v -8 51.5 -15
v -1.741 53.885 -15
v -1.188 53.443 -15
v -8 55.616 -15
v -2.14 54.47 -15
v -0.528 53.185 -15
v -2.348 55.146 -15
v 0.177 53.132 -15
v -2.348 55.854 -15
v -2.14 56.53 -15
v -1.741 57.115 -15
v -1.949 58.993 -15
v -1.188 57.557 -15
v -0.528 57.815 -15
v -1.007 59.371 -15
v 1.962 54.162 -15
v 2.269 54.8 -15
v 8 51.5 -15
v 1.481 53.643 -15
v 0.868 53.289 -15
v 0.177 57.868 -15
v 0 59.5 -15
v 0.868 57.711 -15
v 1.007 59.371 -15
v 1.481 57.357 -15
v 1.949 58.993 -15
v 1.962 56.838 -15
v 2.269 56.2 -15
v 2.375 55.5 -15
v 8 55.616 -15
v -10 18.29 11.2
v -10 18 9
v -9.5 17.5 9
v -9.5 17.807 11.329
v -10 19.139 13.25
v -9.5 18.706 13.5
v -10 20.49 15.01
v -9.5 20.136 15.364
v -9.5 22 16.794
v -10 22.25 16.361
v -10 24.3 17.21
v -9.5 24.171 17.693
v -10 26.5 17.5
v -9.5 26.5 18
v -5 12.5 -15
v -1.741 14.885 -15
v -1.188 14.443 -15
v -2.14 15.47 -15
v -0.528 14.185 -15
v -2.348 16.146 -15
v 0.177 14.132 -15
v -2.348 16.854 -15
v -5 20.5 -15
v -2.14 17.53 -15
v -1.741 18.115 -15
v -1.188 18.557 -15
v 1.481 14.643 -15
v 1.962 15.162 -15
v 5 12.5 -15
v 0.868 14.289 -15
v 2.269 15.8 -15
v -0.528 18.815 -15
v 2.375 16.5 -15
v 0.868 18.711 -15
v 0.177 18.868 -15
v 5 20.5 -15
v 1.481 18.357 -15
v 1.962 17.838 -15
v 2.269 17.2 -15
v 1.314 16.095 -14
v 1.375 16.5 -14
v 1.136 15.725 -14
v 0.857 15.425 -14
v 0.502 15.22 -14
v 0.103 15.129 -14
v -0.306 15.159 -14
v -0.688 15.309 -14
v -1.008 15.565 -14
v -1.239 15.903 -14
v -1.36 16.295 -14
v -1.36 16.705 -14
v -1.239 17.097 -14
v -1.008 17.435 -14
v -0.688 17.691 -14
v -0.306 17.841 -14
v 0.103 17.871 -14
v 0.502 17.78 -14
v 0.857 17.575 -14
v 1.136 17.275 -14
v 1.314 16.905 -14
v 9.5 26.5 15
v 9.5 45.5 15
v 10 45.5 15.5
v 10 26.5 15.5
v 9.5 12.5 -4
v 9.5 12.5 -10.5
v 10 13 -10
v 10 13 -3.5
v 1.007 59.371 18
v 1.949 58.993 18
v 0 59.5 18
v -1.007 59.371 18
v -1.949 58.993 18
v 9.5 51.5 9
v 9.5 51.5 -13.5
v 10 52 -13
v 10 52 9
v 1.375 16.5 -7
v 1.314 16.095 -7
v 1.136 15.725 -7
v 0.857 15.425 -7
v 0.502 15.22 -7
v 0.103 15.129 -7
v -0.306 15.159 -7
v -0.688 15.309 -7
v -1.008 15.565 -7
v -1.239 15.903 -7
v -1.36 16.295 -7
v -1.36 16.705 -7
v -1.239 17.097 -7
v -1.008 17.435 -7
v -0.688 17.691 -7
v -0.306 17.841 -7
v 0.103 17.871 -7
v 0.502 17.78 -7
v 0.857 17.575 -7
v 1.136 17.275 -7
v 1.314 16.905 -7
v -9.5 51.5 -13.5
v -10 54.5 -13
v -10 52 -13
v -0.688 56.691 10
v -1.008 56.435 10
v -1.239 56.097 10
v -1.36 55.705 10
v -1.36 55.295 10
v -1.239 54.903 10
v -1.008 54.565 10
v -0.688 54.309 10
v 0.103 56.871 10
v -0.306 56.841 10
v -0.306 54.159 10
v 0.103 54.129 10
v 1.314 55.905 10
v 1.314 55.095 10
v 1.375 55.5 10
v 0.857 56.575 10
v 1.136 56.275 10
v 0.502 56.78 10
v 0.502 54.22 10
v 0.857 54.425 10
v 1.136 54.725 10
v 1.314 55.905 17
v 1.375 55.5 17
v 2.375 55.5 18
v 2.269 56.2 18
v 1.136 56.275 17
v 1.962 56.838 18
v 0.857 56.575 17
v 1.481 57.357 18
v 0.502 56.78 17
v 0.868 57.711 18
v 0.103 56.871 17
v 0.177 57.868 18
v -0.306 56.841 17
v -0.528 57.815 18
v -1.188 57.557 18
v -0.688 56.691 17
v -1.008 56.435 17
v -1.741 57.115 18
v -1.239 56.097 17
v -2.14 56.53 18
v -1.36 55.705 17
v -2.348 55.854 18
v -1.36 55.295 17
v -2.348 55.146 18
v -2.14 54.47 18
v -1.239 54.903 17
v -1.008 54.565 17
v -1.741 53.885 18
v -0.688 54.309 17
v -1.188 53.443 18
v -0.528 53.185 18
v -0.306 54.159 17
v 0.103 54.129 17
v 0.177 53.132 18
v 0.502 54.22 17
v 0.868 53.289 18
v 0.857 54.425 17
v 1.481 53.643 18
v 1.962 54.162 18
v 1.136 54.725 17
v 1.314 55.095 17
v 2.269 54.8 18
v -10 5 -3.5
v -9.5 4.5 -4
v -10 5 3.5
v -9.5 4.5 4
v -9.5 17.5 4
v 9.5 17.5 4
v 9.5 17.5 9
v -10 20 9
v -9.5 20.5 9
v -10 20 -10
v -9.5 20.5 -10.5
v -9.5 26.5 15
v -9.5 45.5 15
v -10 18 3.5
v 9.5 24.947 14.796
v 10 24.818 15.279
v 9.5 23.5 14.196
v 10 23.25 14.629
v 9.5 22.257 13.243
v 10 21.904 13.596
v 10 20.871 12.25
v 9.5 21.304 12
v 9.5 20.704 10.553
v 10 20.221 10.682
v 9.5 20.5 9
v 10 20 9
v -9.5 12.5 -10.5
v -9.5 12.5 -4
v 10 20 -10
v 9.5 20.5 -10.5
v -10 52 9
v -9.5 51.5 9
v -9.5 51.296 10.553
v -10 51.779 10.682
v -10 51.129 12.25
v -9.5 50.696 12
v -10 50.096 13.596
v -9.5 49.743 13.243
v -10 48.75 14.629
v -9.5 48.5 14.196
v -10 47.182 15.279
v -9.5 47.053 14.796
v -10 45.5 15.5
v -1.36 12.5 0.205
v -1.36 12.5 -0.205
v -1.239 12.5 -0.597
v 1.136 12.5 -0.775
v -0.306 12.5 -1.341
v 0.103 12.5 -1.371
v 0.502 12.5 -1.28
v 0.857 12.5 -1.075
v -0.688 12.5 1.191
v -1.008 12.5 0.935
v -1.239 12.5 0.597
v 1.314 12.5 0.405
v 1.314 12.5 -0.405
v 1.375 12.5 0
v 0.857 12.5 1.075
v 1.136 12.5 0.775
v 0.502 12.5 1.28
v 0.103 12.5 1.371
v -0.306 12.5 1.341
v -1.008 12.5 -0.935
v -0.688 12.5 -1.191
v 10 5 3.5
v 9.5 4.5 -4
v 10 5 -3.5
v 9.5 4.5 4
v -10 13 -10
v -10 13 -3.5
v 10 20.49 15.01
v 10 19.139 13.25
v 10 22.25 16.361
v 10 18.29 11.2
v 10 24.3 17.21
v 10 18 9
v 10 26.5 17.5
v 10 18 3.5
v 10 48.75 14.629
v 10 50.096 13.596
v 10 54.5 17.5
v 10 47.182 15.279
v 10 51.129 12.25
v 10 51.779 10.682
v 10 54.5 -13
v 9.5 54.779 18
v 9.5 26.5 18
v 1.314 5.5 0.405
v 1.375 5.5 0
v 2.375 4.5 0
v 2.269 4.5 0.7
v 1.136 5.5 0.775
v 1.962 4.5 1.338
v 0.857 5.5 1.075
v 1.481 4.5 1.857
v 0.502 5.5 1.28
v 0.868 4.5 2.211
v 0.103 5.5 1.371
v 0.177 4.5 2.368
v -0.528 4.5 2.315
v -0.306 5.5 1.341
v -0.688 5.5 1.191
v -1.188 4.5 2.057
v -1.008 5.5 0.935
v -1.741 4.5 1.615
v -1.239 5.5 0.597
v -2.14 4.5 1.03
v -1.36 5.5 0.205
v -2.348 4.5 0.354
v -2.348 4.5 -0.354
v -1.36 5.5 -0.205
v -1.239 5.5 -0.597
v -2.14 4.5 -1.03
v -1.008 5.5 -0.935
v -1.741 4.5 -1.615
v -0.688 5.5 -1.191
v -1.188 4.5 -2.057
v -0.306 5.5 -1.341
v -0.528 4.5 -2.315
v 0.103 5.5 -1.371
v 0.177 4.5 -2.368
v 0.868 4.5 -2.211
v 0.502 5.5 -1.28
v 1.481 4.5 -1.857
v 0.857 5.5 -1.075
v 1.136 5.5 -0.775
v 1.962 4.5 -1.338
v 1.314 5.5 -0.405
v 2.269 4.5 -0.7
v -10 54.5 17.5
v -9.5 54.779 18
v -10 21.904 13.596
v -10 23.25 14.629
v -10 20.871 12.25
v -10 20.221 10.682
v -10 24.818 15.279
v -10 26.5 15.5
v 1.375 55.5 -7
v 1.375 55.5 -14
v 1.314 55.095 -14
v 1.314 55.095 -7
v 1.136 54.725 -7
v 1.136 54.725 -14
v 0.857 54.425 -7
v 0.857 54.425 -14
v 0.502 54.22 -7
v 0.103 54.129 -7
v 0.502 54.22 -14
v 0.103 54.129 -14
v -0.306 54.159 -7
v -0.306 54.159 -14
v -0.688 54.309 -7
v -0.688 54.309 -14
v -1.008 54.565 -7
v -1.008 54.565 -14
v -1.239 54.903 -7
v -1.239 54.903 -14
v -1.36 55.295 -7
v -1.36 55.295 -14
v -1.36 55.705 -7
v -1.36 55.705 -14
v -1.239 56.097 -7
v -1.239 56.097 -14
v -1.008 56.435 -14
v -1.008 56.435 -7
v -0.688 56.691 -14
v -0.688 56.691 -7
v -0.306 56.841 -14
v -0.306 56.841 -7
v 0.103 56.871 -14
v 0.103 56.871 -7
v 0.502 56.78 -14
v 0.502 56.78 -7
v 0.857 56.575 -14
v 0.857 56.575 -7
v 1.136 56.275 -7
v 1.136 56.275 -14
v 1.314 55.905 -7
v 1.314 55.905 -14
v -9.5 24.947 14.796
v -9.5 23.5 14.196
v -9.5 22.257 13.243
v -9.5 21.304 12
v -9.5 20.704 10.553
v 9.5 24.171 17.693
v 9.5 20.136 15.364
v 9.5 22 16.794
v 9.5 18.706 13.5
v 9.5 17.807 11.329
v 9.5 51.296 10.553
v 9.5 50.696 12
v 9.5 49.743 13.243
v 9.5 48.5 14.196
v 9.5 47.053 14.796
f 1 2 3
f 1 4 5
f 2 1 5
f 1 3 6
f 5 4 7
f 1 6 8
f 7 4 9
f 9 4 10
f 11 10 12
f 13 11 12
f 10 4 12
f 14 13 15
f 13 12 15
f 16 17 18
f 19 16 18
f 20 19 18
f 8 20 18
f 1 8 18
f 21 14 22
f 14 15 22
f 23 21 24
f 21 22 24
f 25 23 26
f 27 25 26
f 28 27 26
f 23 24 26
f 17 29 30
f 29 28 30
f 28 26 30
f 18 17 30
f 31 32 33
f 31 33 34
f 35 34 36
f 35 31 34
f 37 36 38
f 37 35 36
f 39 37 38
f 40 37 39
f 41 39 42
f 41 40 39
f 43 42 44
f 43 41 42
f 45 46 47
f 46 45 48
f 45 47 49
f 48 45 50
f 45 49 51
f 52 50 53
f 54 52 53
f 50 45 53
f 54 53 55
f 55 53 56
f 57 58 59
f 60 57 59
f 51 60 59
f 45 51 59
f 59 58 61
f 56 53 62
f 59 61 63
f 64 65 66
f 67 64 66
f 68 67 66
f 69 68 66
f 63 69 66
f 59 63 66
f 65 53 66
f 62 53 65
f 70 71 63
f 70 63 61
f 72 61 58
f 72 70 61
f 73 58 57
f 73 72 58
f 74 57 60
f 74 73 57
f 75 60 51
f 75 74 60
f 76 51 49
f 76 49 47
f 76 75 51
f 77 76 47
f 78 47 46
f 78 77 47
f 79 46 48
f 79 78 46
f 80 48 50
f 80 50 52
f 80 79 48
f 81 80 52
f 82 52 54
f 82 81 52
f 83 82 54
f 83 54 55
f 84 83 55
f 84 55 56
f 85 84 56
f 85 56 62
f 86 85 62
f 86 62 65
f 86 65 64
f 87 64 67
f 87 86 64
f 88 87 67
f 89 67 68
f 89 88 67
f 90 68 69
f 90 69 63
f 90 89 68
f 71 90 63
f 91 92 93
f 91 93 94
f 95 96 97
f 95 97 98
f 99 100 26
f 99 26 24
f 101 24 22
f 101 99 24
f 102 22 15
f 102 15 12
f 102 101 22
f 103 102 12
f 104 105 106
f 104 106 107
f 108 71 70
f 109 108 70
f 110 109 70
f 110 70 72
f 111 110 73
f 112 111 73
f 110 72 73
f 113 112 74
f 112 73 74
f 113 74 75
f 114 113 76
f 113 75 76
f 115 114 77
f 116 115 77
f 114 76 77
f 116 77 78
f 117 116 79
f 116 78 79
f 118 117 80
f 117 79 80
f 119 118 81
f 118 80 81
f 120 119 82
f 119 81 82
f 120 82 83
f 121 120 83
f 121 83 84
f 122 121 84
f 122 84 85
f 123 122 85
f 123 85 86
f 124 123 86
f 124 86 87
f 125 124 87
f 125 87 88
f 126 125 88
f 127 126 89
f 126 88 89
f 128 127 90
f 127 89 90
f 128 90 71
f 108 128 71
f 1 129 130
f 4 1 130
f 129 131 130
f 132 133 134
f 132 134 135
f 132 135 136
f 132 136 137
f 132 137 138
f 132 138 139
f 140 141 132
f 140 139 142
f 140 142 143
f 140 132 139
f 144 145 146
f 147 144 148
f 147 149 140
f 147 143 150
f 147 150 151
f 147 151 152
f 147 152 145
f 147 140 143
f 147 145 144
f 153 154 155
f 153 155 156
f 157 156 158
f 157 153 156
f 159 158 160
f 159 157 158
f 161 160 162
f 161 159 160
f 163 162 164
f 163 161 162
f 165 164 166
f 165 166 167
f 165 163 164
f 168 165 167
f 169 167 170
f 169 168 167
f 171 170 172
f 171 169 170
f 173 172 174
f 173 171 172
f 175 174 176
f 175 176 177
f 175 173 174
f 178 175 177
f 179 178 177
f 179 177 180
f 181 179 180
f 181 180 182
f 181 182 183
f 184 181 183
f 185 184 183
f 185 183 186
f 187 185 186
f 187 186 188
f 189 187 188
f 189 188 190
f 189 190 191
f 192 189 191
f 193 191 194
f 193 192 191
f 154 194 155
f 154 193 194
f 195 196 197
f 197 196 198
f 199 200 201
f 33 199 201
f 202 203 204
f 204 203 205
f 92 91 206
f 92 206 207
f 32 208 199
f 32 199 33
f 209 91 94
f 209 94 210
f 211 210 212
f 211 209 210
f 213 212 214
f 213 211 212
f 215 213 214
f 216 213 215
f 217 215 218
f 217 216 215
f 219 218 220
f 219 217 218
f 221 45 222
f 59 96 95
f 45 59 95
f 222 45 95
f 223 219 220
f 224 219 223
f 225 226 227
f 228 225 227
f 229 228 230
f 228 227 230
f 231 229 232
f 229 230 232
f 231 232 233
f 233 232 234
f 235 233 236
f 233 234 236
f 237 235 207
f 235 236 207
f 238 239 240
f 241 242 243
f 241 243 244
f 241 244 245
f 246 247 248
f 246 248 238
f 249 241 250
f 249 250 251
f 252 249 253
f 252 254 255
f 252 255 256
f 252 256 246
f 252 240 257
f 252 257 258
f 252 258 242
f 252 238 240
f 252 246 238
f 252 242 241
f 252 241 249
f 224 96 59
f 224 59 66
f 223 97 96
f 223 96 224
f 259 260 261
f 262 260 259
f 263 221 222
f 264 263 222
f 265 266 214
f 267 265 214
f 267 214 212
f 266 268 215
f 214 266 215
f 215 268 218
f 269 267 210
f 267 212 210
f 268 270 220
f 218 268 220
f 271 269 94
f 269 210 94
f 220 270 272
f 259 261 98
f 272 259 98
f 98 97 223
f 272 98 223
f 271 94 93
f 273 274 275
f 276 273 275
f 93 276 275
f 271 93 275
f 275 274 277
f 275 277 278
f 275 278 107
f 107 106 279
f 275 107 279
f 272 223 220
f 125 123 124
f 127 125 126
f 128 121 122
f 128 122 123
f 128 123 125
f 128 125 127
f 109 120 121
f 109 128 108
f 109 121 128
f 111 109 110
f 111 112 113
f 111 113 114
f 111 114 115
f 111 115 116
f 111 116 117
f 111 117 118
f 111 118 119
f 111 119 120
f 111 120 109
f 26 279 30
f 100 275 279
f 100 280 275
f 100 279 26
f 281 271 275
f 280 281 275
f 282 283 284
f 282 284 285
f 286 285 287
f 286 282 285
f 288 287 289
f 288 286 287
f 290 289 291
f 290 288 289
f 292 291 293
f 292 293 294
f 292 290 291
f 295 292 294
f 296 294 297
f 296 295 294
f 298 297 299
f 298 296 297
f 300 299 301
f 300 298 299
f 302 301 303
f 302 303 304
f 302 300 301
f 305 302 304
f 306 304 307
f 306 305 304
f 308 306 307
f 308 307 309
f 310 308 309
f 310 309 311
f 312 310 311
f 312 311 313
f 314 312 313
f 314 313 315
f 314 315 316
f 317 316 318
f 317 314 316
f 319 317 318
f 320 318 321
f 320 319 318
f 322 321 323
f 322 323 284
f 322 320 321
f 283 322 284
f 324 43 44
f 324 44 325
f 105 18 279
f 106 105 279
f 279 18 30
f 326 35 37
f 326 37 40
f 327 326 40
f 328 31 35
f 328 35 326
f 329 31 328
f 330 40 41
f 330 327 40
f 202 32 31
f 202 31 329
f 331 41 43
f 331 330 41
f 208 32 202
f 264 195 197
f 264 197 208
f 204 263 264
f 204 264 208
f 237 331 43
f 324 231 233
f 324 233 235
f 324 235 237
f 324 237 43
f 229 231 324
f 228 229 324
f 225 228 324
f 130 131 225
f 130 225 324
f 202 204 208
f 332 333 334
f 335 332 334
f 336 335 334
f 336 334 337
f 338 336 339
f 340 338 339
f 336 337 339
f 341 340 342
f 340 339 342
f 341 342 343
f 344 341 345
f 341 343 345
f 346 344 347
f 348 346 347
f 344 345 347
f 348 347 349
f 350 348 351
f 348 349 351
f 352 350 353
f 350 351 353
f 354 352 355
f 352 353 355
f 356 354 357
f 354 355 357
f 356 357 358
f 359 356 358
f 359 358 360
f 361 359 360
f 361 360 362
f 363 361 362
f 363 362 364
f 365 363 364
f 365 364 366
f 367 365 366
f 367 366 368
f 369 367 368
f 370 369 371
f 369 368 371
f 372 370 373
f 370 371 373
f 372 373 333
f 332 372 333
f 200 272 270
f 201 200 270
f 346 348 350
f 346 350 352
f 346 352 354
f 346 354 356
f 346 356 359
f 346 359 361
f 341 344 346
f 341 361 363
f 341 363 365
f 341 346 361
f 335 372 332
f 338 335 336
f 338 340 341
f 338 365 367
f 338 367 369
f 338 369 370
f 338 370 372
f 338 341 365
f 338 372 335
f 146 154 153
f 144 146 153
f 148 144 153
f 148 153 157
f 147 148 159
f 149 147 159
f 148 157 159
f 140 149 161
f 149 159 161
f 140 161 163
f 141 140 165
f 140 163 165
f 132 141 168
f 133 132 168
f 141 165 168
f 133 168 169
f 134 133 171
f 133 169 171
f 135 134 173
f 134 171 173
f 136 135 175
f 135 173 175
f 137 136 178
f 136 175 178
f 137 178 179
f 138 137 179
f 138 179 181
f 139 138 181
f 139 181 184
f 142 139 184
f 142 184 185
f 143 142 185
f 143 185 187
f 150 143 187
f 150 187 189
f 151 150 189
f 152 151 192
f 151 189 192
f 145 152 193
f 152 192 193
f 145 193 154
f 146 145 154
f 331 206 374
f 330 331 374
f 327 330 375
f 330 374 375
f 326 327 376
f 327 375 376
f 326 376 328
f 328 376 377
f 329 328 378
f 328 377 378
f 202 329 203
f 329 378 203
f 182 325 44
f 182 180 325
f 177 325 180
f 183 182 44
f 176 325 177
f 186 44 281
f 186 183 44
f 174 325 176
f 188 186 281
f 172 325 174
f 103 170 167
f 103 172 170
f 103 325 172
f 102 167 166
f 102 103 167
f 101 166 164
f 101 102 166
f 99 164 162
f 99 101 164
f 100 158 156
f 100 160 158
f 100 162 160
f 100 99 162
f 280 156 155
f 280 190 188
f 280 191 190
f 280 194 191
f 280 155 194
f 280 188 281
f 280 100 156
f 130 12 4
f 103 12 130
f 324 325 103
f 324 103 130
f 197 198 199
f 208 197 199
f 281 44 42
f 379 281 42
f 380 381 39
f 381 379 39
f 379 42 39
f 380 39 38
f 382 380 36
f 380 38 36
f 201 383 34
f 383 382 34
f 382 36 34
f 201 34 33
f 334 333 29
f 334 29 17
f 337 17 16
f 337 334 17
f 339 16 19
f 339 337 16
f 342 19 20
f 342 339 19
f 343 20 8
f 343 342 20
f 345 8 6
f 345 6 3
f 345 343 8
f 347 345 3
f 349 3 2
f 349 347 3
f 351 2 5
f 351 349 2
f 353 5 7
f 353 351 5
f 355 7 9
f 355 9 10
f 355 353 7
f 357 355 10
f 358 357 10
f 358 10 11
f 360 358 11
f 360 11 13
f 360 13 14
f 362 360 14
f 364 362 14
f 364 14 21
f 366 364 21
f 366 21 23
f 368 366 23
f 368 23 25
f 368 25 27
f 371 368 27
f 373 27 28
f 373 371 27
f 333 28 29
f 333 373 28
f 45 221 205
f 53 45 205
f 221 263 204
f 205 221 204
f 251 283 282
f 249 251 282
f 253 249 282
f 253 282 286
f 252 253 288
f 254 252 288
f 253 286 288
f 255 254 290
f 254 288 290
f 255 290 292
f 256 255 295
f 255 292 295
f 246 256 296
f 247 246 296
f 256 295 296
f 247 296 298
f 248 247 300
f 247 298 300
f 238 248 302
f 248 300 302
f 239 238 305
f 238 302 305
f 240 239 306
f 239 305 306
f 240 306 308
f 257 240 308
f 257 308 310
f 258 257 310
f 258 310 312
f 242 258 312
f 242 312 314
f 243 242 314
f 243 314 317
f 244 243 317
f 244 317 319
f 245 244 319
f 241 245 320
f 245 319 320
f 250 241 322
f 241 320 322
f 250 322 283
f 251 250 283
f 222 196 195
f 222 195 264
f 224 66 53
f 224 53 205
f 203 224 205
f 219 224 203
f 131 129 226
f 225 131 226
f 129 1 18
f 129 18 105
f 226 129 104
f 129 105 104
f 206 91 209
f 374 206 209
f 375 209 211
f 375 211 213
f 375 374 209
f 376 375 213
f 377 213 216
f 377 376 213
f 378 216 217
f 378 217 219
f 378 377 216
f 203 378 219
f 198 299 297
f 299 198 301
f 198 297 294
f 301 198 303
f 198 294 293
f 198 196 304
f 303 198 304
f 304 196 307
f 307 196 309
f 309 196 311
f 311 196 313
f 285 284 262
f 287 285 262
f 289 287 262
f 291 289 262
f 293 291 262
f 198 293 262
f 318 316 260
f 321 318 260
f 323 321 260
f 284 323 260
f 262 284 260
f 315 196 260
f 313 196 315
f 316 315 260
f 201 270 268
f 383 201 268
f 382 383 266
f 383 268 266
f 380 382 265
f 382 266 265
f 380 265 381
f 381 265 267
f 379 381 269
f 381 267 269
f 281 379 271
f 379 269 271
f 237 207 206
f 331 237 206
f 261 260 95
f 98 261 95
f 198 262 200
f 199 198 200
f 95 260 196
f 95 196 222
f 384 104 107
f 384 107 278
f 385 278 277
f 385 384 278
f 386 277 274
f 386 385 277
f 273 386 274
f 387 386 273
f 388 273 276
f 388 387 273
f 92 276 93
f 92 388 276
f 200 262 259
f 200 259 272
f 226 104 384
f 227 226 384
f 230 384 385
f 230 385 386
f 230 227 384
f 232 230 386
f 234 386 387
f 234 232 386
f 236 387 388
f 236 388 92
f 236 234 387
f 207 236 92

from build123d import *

# Parameters (mm, degrees)
BOX_W             = 10
BOX_H             = 50
BOX_DEPTH         = 33
SKETCH005_W       = 31
SKETCH005_H       = 30
SKETCH005_W_2     = 13
SKETCH005_H_2     = 14
SKETCH005_W_3     = 8
SKETCH005_H_3     = 11
POCKET003_DEPTH   = 10
CHAMFER009_SIZE   = 5
FILLET004_1_R     = 9
FILLET004_2_R     = 6
SKETCH010_R       = 1.375
POCKET006_DEPTH   = 8
SKETCH011_R       = 1.375
POCKET007_DEPTH   = 8
CHAMFER011_SIZE   = 1
PAD004_DEPTH      = 33
SKETCH016_R       = 1.375
POCKET011_DEPTH   = 8
SKETCH025_R       = 1.375
POCKET017_DEPTH   = 8
CHAMFER012_1_SIZE = 2
CHAMFER012_2_SIZE = 1
CHAMFER015_SIZE   = 0.5


with BuildPart() as batterybracketbatteryfillet004:
    # Box → Box (new body)
    with BuildSketch(Plane(origin=(0, 4.5, -15), x_dir=(1, 0, 0), z_dir=(0, 0, 1))):
        with Locations((5, 25)):
            Rectangle(BOX_W, BOX_H)
    extrude(amount=BOX_DEPTH)

    # Sketch005 → Pocket003 (cut)
    with BuildSketch(Plane(origin=(10, 4.5, -15), x_dir=(0, 1, 0), z_dir=(1, 0, 0))):
        with Locations((31.5, 15)):
            Rectangle(SKETCH005_W, SKETCH005_H)
        with Locations((6.5, 26)):
            Rectangle(SKETCH005_W_2, SKETCH005_H_2)
        with Locations((4, 5.5)):
            Rectangle(SKETCH005_W_3, SKETCH005_H_3)
    extrude(amount=-POCKET003_DEPTH, mode=Mode.SUBTRACT)

    # Chamfer009
    chamfer009_edges = [batterybracketbatteryfillet004.edges().sort_by_distance(p)[0] for p in [
        (10, 16.5, -15),
    ]]
    chamfer(chamfer009_edges, length=CHAMFER009_SIZE)

    # Fillet004 1
    fillet004_1_edges = [batterybracketbatteryfillet004.edges().sort_by_distance(p)[0] for p in [
        (5, 17.5, 18),
    ]]
    fillet(fillet004_1_edges, radius=FILLET004_1_R)

    # Fillet004 2
    fillet004_2_edges = [batterybracketbatteryfillet004.edges().sort_by_distance(p)[0] for p in [
        (5, 20.5, 15),
        (5, 51.5, 15),
    ]]
    fillet(fillet004_2_edges, radius=FILLET004_2_R)


with BuildPart() as batterybracketprintingchamfer021_final:
    # Part__Mirroring003: instance of BatteryBracketBatteryFillet004
    add(batterybracketbatteryfillet004.part.mirror(Plane(origin=(0, 0, 0), x_dir=(0, -1, 0), z_dir=(1, 0, 0))))

    # Fusion: union BatteryBracketBatteryFillet004
    add(batterybracketbatteryfillet004.part)

    # Sketch010 → Pocket006 (cut)
    with BuildSketch(Plane.XZ.offset(-4.5)):
        Circle(SKETCH010_R)
    extrude(amount=-POCKET006_DEPTH, mode=Mode.SUBTRACT)

    # Sketch011 → Pocket007 (cut)
    with BuildSketch(Plane(origin=(0, 0, -15), x_dir=(1, 0, 0), z_dir=(0, 0, -1))):
        with Locations((0, -16.5)):
            Circle(SKETCH011_R)
    extrude(amount=-POCKET007_DEPTH, mode=Mode.SUBTRACT)

    # Chamfer011
    chamfer011_edges = [batterybracketprintingchamfer021_final.edges().sort_by_distance(p)[0] for p in [
        (-1.375, 4.5, 0),
        (-1.375, 16.5, -15),
    ]]
    chamfer(chamfer011_edges, length=CHAMFER011_SIZE)

    # Sketch015 → Pad004 (new body)
    with BuildSketch(Plane.XY.offset(18)):
        with BuildLine():
            Line((10, 54.5), (1.949289, 58.992889))
            ThreePointArc((1.949289, 58.992889), (0, 59.5), (-1.949289, 58.992889))
            Line((-1.949289, 58.992889), (-10, 54.5))
            Line((-10, 54.5), (10, 54.5))
        make_face()
    extrude(amount=-PAD004_DEPTH)

    # Sketch016 → Pocket011 (cut)
    with BuildSketch(Plane.XY.offset(18)):
        with Locations((0, 55.5)):
            Circle(SKETCH016_R)
    extrude(amount=-POCKET011_DEPTH, mode=Mode.SUBTRACT)

    # Sketch025 → Pocket017 (cut)
    with BuildSketch(Plane(origin=(0, 0, -15), x_dir=(1, 0, 0), z_dir=(0, 0, -1))):
        with Locations((0, -55.5)):
            Circle(SKETCH025_R)
    extrude(amount=-POCKET017_DEPTH, mode=Mode.SUBTRACT)

    # Chamfer012 1
    chamfer012_1_edges = [batterybracketprintingchamfer021_final.edges().sort_by_distance(p)[0] for p in [
        (-10, 53, -15),
        (10, 53, -15),
    ]]
    chamfer(chamfer012_1_edges, length=CHAMFER012_1_SIZE)

    # Chamfer012 2
    chamfer012_2_edges = [batterybracketprintingchamfer021_final.edges().sort_by_distance(p)[0] for p in [
        (-1.375, 55.5, -15),
        (-1.375, 55.5, 18),
    ]]
    chamfer(chamfer012_2_edges, length=CHAMFER012_2_SIZE)

    # Chamfer015
    chamfer015_edges = [batterybracketprintingchamfer021_final.edges().sort_by_distance(p)[0] for p in [
        (-10, 51.5, -2),
        (-10, 49.742641, 13.242641),
        (-10, 36, 15),
        (-10, 40.5, 18),
        (-10, 22.257359, 13.242641),
        (-10, 20.136039, 15.363961),
        (-10, 20.5, -0.5),
        (-10, 17.5, 6.5),
        (-10, 11, 4),
        (-10, 12.5, -7),
        (-10, 4.5, 0),
        (-10, 8.5, -4),
        (10, 51.5, -2),
        (10, 36, 15),
        (10, 40.5, 18),
        (10, 20.5, -0.5),
        (10, 17.5, 6.5),
        (10, 11, 4),
        (10, 12.5, -7),
        (10, 4.5, 0),
        (10, 8.5, -4),
        (10, 49.742641, 13.242641),
        (10, 22.257359, 13.242641),
        (10, 20.136039, 15.363961),
    ]]
    chamfer(chamfer015_edges, length=CHAMFER015_SIZE)


solid = batterybracketprintingchamfer021_final.part
